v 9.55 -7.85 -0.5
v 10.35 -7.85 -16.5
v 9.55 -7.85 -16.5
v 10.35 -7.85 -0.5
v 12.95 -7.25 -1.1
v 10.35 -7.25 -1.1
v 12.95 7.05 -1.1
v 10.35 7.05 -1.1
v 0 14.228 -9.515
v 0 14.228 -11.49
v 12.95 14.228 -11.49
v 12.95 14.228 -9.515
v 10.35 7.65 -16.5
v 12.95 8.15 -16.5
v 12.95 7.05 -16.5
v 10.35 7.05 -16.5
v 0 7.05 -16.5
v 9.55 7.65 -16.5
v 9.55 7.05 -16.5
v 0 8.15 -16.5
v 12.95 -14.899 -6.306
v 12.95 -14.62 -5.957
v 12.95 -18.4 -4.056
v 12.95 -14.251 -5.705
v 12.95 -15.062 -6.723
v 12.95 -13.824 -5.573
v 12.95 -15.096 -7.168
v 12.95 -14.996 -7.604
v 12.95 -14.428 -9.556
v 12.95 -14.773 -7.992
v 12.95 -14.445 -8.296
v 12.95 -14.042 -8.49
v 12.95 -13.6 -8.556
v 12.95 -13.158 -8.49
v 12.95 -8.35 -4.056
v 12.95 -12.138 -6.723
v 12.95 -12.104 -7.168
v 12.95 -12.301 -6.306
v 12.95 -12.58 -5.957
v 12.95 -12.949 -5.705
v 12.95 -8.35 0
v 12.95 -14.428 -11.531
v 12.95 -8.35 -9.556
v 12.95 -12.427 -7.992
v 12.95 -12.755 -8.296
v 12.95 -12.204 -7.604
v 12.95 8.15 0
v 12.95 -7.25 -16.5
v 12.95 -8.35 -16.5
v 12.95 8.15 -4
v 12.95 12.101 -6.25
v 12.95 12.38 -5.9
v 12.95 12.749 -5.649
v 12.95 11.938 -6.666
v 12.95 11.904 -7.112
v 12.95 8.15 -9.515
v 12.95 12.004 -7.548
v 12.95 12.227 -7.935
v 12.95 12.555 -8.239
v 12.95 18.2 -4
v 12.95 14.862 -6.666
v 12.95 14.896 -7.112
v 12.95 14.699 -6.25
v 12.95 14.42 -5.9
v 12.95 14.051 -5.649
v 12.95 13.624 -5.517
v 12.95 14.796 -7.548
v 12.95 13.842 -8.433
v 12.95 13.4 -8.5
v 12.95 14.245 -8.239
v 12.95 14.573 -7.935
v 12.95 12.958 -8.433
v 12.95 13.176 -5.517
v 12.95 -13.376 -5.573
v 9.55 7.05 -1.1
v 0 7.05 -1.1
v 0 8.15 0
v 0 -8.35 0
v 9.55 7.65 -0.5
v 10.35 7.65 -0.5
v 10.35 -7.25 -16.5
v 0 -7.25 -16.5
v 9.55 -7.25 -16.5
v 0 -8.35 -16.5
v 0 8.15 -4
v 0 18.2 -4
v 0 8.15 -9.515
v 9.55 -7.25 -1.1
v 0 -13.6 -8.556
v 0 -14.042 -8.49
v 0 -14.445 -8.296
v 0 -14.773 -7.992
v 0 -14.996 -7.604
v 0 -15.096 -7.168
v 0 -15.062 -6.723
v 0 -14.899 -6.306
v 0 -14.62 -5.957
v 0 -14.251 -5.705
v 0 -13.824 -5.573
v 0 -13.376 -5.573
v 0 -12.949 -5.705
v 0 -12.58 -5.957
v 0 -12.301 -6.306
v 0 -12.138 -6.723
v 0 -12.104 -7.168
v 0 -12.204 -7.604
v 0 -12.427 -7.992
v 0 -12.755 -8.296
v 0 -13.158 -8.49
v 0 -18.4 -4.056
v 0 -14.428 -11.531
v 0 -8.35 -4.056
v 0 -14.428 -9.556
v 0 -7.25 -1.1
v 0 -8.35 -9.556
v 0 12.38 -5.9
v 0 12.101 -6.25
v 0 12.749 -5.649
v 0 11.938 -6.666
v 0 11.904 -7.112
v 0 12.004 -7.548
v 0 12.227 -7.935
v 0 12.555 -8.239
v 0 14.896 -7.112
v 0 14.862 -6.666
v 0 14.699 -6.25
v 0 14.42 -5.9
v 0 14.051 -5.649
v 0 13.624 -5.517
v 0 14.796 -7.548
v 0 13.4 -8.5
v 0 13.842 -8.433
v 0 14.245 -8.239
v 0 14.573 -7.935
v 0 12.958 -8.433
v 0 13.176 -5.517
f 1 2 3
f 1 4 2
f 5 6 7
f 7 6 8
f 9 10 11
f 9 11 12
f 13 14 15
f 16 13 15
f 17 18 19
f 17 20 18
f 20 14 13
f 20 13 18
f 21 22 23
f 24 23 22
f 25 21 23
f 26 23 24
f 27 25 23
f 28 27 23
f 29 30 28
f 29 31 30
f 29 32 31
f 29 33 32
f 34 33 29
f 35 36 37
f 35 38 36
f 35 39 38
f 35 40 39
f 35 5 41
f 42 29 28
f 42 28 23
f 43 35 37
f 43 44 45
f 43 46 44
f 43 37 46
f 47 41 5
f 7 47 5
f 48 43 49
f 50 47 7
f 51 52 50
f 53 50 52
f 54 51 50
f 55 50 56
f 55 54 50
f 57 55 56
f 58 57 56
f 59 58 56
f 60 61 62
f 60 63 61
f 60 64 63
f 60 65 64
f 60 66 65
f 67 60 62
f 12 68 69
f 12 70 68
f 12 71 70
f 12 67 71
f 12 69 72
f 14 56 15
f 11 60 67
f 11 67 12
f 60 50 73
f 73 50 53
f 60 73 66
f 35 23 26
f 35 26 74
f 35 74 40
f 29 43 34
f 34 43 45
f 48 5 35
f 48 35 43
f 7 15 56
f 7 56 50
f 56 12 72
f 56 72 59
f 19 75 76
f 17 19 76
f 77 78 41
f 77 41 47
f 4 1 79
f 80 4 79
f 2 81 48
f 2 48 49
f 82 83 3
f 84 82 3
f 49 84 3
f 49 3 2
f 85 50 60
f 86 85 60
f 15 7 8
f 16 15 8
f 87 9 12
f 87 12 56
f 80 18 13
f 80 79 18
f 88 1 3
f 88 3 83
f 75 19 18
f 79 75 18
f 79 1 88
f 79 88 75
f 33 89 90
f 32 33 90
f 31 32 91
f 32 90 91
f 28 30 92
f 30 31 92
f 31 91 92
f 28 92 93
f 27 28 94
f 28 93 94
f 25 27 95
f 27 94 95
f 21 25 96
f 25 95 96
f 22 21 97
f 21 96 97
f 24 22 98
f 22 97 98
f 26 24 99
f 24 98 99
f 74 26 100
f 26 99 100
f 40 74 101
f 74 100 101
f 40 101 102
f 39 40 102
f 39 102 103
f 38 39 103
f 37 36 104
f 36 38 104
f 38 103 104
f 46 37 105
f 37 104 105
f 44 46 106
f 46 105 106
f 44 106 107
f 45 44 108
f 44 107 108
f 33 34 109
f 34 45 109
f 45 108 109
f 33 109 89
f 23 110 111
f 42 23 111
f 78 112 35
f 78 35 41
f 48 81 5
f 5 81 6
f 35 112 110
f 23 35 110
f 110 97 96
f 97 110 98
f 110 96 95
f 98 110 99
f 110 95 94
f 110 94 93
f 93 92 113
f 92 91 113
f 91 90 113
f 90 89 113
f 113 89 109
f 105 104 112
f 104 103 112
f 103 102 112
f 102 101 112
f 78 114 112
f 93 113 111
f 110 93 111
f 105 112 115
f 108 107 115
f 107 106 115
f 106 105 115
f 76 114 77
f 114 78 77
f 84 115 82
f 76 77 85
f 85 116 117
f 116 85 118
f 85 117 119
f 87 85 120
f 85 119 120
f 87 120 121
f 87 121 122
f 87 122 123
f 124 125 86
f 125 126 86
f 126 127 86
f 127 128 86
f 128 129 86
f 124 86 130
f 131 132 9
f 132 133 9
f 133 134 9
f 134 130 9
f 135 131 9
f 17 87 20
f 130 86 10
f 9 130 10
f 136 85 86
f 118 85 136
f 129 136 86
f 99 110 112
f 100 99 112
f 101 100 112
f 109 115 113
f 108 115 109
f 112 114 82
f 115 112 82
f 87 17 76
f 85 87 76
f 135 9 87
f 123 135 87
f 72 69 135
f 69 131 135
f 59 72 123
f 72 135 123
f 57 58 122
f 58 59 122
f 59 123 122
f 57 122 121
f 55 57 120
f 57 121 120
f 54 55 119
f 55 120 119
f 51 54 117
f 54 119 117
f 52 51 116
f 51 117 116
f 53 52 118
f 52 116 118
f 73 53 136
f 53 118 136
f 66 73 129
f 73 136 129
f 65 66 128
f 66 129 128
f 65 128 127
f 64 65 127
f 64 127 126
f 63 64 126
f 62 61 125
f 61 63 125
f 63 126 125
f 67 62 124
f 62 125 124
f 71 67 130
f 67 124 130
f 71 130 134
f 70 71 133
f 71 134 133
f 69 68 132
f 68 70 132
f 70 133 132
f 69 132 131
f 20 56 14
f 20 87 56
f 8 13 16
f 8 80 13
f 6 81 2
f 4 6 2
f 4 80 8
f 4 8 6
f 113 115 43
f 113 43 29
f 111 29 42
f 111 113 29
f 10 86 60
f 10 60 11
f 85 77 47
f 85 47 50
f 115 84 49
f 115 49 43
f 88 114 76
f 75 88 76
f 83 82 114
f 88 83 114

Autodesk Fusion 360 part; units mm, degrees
sketch "Sketch Metalens Holder" plane through (0, 0, 0) normal (1, 0, 0) x (0, 0, -1)
  line L0 (0, 8.15) -> (16.5, 8.15)
  line L1 (16.5, 8.15) -> (16.5, -8.35)
  line L2 (16.5, -8.35) -> (0, -8.35)
  line L3 (0, -8.35) -> (0, 8.15)
  dimension "d3" = 16.5
  dimension "d4" = 16.5
extrude "Extrude Metalens Holder" add sketch "Sketch Metalens Holder" along normal blind 12.95
shell "Shell Metalens Holder" thickness 1.1 removed faces 2 at (12.95, 2.65, -5.5) at (0, 2.65, -5.5)
sketch "Sketch Screwing Parts" plane through (0, 0, 0) normal (1, 0, 0) x (0, 0, -1)
  line L0 (4, 8.15) -> (4, 18.2)
  line L1 (4, 18.2) -> (11.49, 14.228)
  line L2 (11.49, 14.228) -> (9.515, 14.228)
  line L3 (9.515, 14.228) -> (9.515, 8.15)
  line L4 (4, 8.15) -> (9.515, 8.15)
  circle A0 centre (7, 13.4) radius 1.5
  line L5 (0, 8.15) -> (16.5, 8.15)
  line L6 (4.0564, -8.35) -> (4.0564, -18.4)
  line L7 (0.0564, -8.35) -> (16.5564, -8.35)
  line L8 (0, -8.35) -> (16.5, -8.35)
  line L9 (9.5564, -8.35) -> (9.5564, -14.428)
  line L10 (9.5564, -14.428) -> (11.5314, -14.428)
  line L11 (4.0564, -18.4) -> (11.5314, -14.428)
  circle A1 centre (7.0564, -13.6) radius 1.5
  point P0 (0, 8.15)
  dimension "d48" = 10.05
  dimension "d50" = 8.478
  dimension "d51" = 1.975
  dimension "d55" = 3
  dimension "d57" = 4.8
  dimension "d65" = 16.5
  dimension "d66" = 4
  dimension "d68" = 5.5
  dimension "d72" = 4.8
  dimension "d73" = 9.5
  dimension "d74" = 7
  dimension "d75" = 6.078
  dimension "d76" = 27
  dimension "d77" = 36.6
extrude "Extrude Crewing Parts" add sketch "Sketch Screwing Parts" along normal blind 12.95
ref_plane "WorkPlane1" through (9.95, -0.1, -8.25) normal (1, 0, 0) x (0, 0, -1)
sketch "Sketch Inside Slit" plane through (9.95, 0, 0) normal (1, 0, 0) x (0, 0, -1)
  line L0 (15.4, 7.05) -> (15.4, -7.25)
  line L1 (0.5, 7.65) -> (16, 7.65)
  line L2 (16, 7.65) -> (16, -7.85)
  line L3 (16, -7.85) -> (0.5, -7.85)
  line L4 (0.5, -7.85) -> (0.5, 7.65)
  line L5 (15.4, 7.05) -> (1.1, 7.05)
  line L6 (1.1, 7.05) -> (1.1, -7.25)
  line L7 (1.1, -7.25) -> (15.4, -7.25)
  line L8 (15.4, -7.25) -> (15.4, 7.05)
  line L9 (15.4, 7.05) -> (0.5, 7.05)
  line L10 (1.1, 7.05) -> (16, 7.05)
  line L11 (1.1, -7.25) -> (16, -7.25)
  line L12 (15.4, -7.25) -> (0.5, -7.25)
  line L13 (16.5, -8.35) -> (16.5, 8.15)
  line L14 (16.5, 8.15) -> (9.515, 8.15)
  point P0 (1.1, -7.25)
  point P1 (1.1, 7.05)
  dimension "d91" = 15.5
  dimension "d132" = 0.5
  dimension "d133" = 0.5
extrude "Extrude Inside Slit" cut sketch "Sketch Inside Slit" along normal mid plane 0.8
extrude "Extrude Remove 4th Wall" cut 2 faces at (3.1833, 2.2833, -15.4) (11.2167, 2.2833, -15.4) along direction (0, 0, -1) blind 1.1
extrude "Extrude Remove 4th Wall Bis" cut 1 faces at (10.0833, -2.4833, -16) along direction (0, 0, -1) blind 0.6
